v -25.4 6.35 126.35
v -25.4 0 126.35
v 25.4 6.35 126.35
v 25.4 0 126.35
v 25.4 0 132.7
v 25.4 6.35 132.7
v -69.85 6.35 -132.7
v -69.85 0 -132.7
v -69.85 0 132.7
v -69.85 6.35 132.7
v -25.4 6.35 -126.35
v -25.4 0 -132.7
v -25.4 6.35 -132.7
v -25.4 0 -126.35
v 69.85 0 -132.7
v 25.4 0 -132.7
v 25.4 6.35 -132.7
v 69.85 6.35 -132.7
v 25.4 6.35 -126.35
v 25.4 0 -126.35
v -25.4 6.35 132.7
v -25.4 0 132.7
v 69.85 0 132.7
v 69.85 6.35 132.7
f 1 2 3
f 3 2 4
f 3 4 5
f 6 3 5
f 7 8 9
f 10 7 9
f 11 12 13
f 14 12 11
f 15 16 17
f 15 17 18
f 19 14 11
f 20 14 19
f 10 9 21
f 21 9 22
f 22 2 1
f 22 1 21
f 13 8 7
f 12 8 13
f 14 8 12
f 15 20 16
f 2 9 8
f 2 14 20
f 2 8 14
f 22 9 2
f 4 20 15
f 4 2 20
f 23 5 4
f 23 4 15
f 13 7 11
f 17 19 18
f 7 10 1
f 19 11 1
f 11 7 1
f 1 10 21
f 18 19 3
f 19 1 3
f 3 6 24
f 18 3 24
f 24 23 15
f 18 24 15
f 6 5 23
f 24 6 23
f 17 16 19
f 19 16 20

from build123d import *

# Parameters (mm, degrees)
SKETCH5_W           = 395.4
SKETCH5_H           = 265.4
BOSS_EXTRUDE3_DEPTH = 6.35
SKETCH6_W           = 78.175
SKETCH6_H           = 243.175
SKETCH6_W_2         = 75
SKETCH6_H_2         = 240
CUT_EXTRUDE1_DEPTH  = 6.35
SKETCH10_W          = 6.35
SKETCH10_H          = 50.8
SKETCH10_W_2        = 50.8
SKETCH10_H_2        = 6.35
CUT_EXTRUDE2_DEPTH  = 6.35
SKETCH11_W          = 50.8
SKETCH11_H          = 6.35
CUT_EXTRUDE3_DEPTH  = 6.35
SKETCH12_W          = 78.175
SKETCH12_H          = 4.7625
BOSS_EXTRUDE4_DEPTH = 6.35
FILLET1_R           = 3.175
CUT_EXTRUDE4_DEPTH  = 239.190895082


with BuildPart() as part:
    # Sketch5 → Boss-Extrude3 (new body)
    with BuildSketch(Plane(origin=(0, 0, 0), x_dir=(1, 0, 0), z_dir=(0, 1, 0))):
        Rectangle(SKETCH5_W, SKETCH5_H)
    extrude(amount=BOSS_EXTRUDE3_DEPTH)

    # Sketch6 → Cut-Extrude1 (cut)
    # profile 1 of 4: a face of its own
    with BuildSketch(Plane(origin=(0, 6.35, 0), x_dir=(1, 0, 0), z_dir=(0, 1, 0))):
        with Locations((147.5, 0)):
            Rectangle(SKETCH6_W, SKETCH6_H)
        with Locations((147.5, 0)):
            Rectangle(SKETCH6_W_2, SKETCH6_H_2, mode=Mode.SUBTRACT)
    # profile 2 of 4: a face of its own
    with BuildSketch(Plane(origin=(0, 6.35, 0), x_dir=(1, 0, 0), z_dir=(0, 1, 0))):
        with Locations((147.5, 0)):
            Rectangle(SKETCH6_W_2, SKETCH6_H_2)
    # profile 3 of 4: a face of its own
    with BuildSketch(Plane(origin=(0, 6.35, 0), x_dir=(1, 0, 0), z_dir=(0, 1, 0))):
        with Locations((-147.5, 0)):
            Rectangle(SKETCH6_W, SKETCH6_H)
        with Locations((-147.5, 0)):
            Rectangle(SKETCH6_W_2, SKETCH6_H_2, mode=Mode.SUBTRACT)
    # profile 4 of 4: a face of its own
    with BuildSketch(Plane(origin=(0, 6.35, 0), x_dir=(1, 0, 0), z_dir=(0, 1, 0))):
        with Locations((-147.5, 0)):
            Rectangle(SKETCH6_W_2, SKETCH6_H_2)
    extrude(amount=-CUT_EXTRUDE1_DEPTH, mode=Mode.SUBTRACT)

    # Sketch10 → Cut-Extrude2 (cut)
    with BuildSketch(Plane.XZ):
        with Locations((98.8875, -63.5)):
            Rectangle(SKETCH10_W, SKETCH10_H)
        with Locations((98.8875, 63.5)):
            Rectangle(SKETCH10_W, SKETCH10_H)
        with Locations((-98.8875, 63.5)):
            Rectangle(SKETCH10_W, SKETCH10_H)
        with Locations((-98.8875, -63.5)):
            Rectangle(SKETCH10_W, SKETCH10_H)
        Polygon((197.7, 132.7), (177.8, 132.7), (177.8, 126.35), (191.35, 126.35), (197.7, 126.35), align=None)
        Polygon((127, 132.7), (76.2, 132.7), (76.2, 126.35), (95.7125, 126.35), (102.0625, 126.35), (108.4125, 126.35), (127, 126.35), align=None)
        with Locations((0, 129.525)):
            Rectangle(SKETCH10_W_2, SKETCH10_H_2)
        Polygon((-127, 132.7), (-127, 126.35), (-108.4125, 126.35), (-102.0625, 126.35), (-95.7125, 126.35), (-76.2, 126.35), (-76.2, 132.7), align=None)
        Polygon((-197.7, 126.35), (-191.35, 126.35), (-177.8, 126.35), (-177.8, 132.7), (-197.7, 132.7), align=None)
        Polygon((-177.8, -126.35), (-191.35, -126.35), (-197.7, -126.35), (-197.7, -132.7), (-177.8, -132.7), align=None)
        Polygon((-108.4125, -126.35), (-127, -126.35), (-127, -132.7), (-76.2, -132.7), (-76.2, -126.35), (-95.7125, -126.35), (-102.0625, -126.35), align=None)
        with Locations((0, -129.525)):
            Rectangle(SKETCH10_W_2, SKETCH10_H_2)
        Polygon((76.2, -126.35), (76.2, -132.7), (127, -132.7), (127, -126.35), (108.4125, -126.35), (102.0625, -126.35), (95.7125, -126.35), align=None)
        Polygon((177.8, -126.35), (177.8, -132.7), (197.7, -132.7), (197.7, -126.35), (191.35, -126.35), align=None)
    extrude(amount=-CUT_EXTRUDE2_DEPTH, mode=Mode.SUBTRACT)

    # Sketch11 → Cut-Extrude3 (cut)
    with BuildSketch(Plane(origin=(197.7, 0, 0), x_dir=(0, 0, -1), z_dir=(1, 0, 0))):
        with Locations((-63.5, 3.175)):
            Rectangle(SKETCH11_W, SKETCH11_H)
        with Locations((63.5, 3.175)):
            Rectangle(SKETCH11_W, SKETCH11_H)
    cut_extrude3 = extrude(amount=-CUT_EXTRUDE3_DEPTH, mode=Mode.SUBTRACT)

    # Mirror1: Cut-Extrude3 across plane
    add(cut_extrude3.mirror(Plane(origin=(0, 0, 0), x_dir=(0, 0, 1), z_dir=(1, 0, 0))), mode=Mode.SUBTRACT)

    # Sketch12 → Boss-Extrude4 (add)
    with BuildSketch(Plane.XZ):
        with Locations((147.5, -119.20625)):
            Rectangle(SKETCH12_W, SKETCH12_H)
        with Locations((147.5, 119.20625)):
            Rectangle(SKETCH12_W, SKETCH12_H)
        with Locations((-147.5, 119.20625)):
            Rectangle(SKETCH12_W, SKETCH12_H)
        with Locations((-147.5, -119.20625)):
            Rectangle(SKETCH12_W, SKETCH12_H)
    extrude(amount=-BOSS_EXTRUDE4_DEPTH)

    # Fillet1
    fillet1_edges = [part.edges().sort_by_distance(p)[0] for p in [
        (108.4125, 3.175, -116.825),
        (186.5875, 3.175, -116.825),
        (186.5875, 3.175, 116.825),
        (108.4125, 3.175, 116.825),
        (-186.5875, 3.175, 116.825),
        (-108.4125, 3.175, 116.825),
        (-108.4125, 3.175, -116.825),
        (-186.5875, 3.175, -116.825),
    ]]
    fillet(fillet1_edges, radius=FILLET1_R)

    # Sketch13 → Cut-Extrude4 (cut, through all)
    with BuildSketch(Plane.XZ):
        Polygon((69.85, 132.7), (69.85, -132.7), (76.2, -132.7), (76.2, -126.35), (127, -126.35), (127, -132.7), (177.8, -132.7), (177.8, -126.35), (197.7, -126.35), (197.7, -88.9), (191.35, -88.9), (191.35, -38.1), (197.7, -38.1), (197.7, 38.1), (191.35, 38.1), (191.35, 88.9), (197.7, 88.9), (197.7, 126.35), (177.8, 126.35), (177.8, 132.7), (127, 132.7), (127, 126.35), (76.2, 126.35), (76.2, 132.7), align=None)
        Polygon((-76.2, -132.7), (-69.85, -132.7), (-69.85, 132.7), (-76.2, 132.7), (-76.2, 126.35), (-127, 126.35), (-127, 132.7), (-177.8, 132.7), (-177.8, 126.35), (-197.7, 126.35), (-197.7, 88.9), (-191.35, 88.9), (-191.35, 38.1), (-197.7, 38.1), (-197.7, -38.1), (-191.35, -38.1), (-191.35, -88.9), (-197.7, -88.9), (-197.7, -126.35), (-177.8, -126.35), (-177.8, -132.7), (-127, -132.7), (-127, -126.35), (-76.2, -126.35), align=None)
    extrude(amount=-CUT_EXTRUDE4_DEPTH, mode=Mode.SUBTRACT)


solid = part.part
